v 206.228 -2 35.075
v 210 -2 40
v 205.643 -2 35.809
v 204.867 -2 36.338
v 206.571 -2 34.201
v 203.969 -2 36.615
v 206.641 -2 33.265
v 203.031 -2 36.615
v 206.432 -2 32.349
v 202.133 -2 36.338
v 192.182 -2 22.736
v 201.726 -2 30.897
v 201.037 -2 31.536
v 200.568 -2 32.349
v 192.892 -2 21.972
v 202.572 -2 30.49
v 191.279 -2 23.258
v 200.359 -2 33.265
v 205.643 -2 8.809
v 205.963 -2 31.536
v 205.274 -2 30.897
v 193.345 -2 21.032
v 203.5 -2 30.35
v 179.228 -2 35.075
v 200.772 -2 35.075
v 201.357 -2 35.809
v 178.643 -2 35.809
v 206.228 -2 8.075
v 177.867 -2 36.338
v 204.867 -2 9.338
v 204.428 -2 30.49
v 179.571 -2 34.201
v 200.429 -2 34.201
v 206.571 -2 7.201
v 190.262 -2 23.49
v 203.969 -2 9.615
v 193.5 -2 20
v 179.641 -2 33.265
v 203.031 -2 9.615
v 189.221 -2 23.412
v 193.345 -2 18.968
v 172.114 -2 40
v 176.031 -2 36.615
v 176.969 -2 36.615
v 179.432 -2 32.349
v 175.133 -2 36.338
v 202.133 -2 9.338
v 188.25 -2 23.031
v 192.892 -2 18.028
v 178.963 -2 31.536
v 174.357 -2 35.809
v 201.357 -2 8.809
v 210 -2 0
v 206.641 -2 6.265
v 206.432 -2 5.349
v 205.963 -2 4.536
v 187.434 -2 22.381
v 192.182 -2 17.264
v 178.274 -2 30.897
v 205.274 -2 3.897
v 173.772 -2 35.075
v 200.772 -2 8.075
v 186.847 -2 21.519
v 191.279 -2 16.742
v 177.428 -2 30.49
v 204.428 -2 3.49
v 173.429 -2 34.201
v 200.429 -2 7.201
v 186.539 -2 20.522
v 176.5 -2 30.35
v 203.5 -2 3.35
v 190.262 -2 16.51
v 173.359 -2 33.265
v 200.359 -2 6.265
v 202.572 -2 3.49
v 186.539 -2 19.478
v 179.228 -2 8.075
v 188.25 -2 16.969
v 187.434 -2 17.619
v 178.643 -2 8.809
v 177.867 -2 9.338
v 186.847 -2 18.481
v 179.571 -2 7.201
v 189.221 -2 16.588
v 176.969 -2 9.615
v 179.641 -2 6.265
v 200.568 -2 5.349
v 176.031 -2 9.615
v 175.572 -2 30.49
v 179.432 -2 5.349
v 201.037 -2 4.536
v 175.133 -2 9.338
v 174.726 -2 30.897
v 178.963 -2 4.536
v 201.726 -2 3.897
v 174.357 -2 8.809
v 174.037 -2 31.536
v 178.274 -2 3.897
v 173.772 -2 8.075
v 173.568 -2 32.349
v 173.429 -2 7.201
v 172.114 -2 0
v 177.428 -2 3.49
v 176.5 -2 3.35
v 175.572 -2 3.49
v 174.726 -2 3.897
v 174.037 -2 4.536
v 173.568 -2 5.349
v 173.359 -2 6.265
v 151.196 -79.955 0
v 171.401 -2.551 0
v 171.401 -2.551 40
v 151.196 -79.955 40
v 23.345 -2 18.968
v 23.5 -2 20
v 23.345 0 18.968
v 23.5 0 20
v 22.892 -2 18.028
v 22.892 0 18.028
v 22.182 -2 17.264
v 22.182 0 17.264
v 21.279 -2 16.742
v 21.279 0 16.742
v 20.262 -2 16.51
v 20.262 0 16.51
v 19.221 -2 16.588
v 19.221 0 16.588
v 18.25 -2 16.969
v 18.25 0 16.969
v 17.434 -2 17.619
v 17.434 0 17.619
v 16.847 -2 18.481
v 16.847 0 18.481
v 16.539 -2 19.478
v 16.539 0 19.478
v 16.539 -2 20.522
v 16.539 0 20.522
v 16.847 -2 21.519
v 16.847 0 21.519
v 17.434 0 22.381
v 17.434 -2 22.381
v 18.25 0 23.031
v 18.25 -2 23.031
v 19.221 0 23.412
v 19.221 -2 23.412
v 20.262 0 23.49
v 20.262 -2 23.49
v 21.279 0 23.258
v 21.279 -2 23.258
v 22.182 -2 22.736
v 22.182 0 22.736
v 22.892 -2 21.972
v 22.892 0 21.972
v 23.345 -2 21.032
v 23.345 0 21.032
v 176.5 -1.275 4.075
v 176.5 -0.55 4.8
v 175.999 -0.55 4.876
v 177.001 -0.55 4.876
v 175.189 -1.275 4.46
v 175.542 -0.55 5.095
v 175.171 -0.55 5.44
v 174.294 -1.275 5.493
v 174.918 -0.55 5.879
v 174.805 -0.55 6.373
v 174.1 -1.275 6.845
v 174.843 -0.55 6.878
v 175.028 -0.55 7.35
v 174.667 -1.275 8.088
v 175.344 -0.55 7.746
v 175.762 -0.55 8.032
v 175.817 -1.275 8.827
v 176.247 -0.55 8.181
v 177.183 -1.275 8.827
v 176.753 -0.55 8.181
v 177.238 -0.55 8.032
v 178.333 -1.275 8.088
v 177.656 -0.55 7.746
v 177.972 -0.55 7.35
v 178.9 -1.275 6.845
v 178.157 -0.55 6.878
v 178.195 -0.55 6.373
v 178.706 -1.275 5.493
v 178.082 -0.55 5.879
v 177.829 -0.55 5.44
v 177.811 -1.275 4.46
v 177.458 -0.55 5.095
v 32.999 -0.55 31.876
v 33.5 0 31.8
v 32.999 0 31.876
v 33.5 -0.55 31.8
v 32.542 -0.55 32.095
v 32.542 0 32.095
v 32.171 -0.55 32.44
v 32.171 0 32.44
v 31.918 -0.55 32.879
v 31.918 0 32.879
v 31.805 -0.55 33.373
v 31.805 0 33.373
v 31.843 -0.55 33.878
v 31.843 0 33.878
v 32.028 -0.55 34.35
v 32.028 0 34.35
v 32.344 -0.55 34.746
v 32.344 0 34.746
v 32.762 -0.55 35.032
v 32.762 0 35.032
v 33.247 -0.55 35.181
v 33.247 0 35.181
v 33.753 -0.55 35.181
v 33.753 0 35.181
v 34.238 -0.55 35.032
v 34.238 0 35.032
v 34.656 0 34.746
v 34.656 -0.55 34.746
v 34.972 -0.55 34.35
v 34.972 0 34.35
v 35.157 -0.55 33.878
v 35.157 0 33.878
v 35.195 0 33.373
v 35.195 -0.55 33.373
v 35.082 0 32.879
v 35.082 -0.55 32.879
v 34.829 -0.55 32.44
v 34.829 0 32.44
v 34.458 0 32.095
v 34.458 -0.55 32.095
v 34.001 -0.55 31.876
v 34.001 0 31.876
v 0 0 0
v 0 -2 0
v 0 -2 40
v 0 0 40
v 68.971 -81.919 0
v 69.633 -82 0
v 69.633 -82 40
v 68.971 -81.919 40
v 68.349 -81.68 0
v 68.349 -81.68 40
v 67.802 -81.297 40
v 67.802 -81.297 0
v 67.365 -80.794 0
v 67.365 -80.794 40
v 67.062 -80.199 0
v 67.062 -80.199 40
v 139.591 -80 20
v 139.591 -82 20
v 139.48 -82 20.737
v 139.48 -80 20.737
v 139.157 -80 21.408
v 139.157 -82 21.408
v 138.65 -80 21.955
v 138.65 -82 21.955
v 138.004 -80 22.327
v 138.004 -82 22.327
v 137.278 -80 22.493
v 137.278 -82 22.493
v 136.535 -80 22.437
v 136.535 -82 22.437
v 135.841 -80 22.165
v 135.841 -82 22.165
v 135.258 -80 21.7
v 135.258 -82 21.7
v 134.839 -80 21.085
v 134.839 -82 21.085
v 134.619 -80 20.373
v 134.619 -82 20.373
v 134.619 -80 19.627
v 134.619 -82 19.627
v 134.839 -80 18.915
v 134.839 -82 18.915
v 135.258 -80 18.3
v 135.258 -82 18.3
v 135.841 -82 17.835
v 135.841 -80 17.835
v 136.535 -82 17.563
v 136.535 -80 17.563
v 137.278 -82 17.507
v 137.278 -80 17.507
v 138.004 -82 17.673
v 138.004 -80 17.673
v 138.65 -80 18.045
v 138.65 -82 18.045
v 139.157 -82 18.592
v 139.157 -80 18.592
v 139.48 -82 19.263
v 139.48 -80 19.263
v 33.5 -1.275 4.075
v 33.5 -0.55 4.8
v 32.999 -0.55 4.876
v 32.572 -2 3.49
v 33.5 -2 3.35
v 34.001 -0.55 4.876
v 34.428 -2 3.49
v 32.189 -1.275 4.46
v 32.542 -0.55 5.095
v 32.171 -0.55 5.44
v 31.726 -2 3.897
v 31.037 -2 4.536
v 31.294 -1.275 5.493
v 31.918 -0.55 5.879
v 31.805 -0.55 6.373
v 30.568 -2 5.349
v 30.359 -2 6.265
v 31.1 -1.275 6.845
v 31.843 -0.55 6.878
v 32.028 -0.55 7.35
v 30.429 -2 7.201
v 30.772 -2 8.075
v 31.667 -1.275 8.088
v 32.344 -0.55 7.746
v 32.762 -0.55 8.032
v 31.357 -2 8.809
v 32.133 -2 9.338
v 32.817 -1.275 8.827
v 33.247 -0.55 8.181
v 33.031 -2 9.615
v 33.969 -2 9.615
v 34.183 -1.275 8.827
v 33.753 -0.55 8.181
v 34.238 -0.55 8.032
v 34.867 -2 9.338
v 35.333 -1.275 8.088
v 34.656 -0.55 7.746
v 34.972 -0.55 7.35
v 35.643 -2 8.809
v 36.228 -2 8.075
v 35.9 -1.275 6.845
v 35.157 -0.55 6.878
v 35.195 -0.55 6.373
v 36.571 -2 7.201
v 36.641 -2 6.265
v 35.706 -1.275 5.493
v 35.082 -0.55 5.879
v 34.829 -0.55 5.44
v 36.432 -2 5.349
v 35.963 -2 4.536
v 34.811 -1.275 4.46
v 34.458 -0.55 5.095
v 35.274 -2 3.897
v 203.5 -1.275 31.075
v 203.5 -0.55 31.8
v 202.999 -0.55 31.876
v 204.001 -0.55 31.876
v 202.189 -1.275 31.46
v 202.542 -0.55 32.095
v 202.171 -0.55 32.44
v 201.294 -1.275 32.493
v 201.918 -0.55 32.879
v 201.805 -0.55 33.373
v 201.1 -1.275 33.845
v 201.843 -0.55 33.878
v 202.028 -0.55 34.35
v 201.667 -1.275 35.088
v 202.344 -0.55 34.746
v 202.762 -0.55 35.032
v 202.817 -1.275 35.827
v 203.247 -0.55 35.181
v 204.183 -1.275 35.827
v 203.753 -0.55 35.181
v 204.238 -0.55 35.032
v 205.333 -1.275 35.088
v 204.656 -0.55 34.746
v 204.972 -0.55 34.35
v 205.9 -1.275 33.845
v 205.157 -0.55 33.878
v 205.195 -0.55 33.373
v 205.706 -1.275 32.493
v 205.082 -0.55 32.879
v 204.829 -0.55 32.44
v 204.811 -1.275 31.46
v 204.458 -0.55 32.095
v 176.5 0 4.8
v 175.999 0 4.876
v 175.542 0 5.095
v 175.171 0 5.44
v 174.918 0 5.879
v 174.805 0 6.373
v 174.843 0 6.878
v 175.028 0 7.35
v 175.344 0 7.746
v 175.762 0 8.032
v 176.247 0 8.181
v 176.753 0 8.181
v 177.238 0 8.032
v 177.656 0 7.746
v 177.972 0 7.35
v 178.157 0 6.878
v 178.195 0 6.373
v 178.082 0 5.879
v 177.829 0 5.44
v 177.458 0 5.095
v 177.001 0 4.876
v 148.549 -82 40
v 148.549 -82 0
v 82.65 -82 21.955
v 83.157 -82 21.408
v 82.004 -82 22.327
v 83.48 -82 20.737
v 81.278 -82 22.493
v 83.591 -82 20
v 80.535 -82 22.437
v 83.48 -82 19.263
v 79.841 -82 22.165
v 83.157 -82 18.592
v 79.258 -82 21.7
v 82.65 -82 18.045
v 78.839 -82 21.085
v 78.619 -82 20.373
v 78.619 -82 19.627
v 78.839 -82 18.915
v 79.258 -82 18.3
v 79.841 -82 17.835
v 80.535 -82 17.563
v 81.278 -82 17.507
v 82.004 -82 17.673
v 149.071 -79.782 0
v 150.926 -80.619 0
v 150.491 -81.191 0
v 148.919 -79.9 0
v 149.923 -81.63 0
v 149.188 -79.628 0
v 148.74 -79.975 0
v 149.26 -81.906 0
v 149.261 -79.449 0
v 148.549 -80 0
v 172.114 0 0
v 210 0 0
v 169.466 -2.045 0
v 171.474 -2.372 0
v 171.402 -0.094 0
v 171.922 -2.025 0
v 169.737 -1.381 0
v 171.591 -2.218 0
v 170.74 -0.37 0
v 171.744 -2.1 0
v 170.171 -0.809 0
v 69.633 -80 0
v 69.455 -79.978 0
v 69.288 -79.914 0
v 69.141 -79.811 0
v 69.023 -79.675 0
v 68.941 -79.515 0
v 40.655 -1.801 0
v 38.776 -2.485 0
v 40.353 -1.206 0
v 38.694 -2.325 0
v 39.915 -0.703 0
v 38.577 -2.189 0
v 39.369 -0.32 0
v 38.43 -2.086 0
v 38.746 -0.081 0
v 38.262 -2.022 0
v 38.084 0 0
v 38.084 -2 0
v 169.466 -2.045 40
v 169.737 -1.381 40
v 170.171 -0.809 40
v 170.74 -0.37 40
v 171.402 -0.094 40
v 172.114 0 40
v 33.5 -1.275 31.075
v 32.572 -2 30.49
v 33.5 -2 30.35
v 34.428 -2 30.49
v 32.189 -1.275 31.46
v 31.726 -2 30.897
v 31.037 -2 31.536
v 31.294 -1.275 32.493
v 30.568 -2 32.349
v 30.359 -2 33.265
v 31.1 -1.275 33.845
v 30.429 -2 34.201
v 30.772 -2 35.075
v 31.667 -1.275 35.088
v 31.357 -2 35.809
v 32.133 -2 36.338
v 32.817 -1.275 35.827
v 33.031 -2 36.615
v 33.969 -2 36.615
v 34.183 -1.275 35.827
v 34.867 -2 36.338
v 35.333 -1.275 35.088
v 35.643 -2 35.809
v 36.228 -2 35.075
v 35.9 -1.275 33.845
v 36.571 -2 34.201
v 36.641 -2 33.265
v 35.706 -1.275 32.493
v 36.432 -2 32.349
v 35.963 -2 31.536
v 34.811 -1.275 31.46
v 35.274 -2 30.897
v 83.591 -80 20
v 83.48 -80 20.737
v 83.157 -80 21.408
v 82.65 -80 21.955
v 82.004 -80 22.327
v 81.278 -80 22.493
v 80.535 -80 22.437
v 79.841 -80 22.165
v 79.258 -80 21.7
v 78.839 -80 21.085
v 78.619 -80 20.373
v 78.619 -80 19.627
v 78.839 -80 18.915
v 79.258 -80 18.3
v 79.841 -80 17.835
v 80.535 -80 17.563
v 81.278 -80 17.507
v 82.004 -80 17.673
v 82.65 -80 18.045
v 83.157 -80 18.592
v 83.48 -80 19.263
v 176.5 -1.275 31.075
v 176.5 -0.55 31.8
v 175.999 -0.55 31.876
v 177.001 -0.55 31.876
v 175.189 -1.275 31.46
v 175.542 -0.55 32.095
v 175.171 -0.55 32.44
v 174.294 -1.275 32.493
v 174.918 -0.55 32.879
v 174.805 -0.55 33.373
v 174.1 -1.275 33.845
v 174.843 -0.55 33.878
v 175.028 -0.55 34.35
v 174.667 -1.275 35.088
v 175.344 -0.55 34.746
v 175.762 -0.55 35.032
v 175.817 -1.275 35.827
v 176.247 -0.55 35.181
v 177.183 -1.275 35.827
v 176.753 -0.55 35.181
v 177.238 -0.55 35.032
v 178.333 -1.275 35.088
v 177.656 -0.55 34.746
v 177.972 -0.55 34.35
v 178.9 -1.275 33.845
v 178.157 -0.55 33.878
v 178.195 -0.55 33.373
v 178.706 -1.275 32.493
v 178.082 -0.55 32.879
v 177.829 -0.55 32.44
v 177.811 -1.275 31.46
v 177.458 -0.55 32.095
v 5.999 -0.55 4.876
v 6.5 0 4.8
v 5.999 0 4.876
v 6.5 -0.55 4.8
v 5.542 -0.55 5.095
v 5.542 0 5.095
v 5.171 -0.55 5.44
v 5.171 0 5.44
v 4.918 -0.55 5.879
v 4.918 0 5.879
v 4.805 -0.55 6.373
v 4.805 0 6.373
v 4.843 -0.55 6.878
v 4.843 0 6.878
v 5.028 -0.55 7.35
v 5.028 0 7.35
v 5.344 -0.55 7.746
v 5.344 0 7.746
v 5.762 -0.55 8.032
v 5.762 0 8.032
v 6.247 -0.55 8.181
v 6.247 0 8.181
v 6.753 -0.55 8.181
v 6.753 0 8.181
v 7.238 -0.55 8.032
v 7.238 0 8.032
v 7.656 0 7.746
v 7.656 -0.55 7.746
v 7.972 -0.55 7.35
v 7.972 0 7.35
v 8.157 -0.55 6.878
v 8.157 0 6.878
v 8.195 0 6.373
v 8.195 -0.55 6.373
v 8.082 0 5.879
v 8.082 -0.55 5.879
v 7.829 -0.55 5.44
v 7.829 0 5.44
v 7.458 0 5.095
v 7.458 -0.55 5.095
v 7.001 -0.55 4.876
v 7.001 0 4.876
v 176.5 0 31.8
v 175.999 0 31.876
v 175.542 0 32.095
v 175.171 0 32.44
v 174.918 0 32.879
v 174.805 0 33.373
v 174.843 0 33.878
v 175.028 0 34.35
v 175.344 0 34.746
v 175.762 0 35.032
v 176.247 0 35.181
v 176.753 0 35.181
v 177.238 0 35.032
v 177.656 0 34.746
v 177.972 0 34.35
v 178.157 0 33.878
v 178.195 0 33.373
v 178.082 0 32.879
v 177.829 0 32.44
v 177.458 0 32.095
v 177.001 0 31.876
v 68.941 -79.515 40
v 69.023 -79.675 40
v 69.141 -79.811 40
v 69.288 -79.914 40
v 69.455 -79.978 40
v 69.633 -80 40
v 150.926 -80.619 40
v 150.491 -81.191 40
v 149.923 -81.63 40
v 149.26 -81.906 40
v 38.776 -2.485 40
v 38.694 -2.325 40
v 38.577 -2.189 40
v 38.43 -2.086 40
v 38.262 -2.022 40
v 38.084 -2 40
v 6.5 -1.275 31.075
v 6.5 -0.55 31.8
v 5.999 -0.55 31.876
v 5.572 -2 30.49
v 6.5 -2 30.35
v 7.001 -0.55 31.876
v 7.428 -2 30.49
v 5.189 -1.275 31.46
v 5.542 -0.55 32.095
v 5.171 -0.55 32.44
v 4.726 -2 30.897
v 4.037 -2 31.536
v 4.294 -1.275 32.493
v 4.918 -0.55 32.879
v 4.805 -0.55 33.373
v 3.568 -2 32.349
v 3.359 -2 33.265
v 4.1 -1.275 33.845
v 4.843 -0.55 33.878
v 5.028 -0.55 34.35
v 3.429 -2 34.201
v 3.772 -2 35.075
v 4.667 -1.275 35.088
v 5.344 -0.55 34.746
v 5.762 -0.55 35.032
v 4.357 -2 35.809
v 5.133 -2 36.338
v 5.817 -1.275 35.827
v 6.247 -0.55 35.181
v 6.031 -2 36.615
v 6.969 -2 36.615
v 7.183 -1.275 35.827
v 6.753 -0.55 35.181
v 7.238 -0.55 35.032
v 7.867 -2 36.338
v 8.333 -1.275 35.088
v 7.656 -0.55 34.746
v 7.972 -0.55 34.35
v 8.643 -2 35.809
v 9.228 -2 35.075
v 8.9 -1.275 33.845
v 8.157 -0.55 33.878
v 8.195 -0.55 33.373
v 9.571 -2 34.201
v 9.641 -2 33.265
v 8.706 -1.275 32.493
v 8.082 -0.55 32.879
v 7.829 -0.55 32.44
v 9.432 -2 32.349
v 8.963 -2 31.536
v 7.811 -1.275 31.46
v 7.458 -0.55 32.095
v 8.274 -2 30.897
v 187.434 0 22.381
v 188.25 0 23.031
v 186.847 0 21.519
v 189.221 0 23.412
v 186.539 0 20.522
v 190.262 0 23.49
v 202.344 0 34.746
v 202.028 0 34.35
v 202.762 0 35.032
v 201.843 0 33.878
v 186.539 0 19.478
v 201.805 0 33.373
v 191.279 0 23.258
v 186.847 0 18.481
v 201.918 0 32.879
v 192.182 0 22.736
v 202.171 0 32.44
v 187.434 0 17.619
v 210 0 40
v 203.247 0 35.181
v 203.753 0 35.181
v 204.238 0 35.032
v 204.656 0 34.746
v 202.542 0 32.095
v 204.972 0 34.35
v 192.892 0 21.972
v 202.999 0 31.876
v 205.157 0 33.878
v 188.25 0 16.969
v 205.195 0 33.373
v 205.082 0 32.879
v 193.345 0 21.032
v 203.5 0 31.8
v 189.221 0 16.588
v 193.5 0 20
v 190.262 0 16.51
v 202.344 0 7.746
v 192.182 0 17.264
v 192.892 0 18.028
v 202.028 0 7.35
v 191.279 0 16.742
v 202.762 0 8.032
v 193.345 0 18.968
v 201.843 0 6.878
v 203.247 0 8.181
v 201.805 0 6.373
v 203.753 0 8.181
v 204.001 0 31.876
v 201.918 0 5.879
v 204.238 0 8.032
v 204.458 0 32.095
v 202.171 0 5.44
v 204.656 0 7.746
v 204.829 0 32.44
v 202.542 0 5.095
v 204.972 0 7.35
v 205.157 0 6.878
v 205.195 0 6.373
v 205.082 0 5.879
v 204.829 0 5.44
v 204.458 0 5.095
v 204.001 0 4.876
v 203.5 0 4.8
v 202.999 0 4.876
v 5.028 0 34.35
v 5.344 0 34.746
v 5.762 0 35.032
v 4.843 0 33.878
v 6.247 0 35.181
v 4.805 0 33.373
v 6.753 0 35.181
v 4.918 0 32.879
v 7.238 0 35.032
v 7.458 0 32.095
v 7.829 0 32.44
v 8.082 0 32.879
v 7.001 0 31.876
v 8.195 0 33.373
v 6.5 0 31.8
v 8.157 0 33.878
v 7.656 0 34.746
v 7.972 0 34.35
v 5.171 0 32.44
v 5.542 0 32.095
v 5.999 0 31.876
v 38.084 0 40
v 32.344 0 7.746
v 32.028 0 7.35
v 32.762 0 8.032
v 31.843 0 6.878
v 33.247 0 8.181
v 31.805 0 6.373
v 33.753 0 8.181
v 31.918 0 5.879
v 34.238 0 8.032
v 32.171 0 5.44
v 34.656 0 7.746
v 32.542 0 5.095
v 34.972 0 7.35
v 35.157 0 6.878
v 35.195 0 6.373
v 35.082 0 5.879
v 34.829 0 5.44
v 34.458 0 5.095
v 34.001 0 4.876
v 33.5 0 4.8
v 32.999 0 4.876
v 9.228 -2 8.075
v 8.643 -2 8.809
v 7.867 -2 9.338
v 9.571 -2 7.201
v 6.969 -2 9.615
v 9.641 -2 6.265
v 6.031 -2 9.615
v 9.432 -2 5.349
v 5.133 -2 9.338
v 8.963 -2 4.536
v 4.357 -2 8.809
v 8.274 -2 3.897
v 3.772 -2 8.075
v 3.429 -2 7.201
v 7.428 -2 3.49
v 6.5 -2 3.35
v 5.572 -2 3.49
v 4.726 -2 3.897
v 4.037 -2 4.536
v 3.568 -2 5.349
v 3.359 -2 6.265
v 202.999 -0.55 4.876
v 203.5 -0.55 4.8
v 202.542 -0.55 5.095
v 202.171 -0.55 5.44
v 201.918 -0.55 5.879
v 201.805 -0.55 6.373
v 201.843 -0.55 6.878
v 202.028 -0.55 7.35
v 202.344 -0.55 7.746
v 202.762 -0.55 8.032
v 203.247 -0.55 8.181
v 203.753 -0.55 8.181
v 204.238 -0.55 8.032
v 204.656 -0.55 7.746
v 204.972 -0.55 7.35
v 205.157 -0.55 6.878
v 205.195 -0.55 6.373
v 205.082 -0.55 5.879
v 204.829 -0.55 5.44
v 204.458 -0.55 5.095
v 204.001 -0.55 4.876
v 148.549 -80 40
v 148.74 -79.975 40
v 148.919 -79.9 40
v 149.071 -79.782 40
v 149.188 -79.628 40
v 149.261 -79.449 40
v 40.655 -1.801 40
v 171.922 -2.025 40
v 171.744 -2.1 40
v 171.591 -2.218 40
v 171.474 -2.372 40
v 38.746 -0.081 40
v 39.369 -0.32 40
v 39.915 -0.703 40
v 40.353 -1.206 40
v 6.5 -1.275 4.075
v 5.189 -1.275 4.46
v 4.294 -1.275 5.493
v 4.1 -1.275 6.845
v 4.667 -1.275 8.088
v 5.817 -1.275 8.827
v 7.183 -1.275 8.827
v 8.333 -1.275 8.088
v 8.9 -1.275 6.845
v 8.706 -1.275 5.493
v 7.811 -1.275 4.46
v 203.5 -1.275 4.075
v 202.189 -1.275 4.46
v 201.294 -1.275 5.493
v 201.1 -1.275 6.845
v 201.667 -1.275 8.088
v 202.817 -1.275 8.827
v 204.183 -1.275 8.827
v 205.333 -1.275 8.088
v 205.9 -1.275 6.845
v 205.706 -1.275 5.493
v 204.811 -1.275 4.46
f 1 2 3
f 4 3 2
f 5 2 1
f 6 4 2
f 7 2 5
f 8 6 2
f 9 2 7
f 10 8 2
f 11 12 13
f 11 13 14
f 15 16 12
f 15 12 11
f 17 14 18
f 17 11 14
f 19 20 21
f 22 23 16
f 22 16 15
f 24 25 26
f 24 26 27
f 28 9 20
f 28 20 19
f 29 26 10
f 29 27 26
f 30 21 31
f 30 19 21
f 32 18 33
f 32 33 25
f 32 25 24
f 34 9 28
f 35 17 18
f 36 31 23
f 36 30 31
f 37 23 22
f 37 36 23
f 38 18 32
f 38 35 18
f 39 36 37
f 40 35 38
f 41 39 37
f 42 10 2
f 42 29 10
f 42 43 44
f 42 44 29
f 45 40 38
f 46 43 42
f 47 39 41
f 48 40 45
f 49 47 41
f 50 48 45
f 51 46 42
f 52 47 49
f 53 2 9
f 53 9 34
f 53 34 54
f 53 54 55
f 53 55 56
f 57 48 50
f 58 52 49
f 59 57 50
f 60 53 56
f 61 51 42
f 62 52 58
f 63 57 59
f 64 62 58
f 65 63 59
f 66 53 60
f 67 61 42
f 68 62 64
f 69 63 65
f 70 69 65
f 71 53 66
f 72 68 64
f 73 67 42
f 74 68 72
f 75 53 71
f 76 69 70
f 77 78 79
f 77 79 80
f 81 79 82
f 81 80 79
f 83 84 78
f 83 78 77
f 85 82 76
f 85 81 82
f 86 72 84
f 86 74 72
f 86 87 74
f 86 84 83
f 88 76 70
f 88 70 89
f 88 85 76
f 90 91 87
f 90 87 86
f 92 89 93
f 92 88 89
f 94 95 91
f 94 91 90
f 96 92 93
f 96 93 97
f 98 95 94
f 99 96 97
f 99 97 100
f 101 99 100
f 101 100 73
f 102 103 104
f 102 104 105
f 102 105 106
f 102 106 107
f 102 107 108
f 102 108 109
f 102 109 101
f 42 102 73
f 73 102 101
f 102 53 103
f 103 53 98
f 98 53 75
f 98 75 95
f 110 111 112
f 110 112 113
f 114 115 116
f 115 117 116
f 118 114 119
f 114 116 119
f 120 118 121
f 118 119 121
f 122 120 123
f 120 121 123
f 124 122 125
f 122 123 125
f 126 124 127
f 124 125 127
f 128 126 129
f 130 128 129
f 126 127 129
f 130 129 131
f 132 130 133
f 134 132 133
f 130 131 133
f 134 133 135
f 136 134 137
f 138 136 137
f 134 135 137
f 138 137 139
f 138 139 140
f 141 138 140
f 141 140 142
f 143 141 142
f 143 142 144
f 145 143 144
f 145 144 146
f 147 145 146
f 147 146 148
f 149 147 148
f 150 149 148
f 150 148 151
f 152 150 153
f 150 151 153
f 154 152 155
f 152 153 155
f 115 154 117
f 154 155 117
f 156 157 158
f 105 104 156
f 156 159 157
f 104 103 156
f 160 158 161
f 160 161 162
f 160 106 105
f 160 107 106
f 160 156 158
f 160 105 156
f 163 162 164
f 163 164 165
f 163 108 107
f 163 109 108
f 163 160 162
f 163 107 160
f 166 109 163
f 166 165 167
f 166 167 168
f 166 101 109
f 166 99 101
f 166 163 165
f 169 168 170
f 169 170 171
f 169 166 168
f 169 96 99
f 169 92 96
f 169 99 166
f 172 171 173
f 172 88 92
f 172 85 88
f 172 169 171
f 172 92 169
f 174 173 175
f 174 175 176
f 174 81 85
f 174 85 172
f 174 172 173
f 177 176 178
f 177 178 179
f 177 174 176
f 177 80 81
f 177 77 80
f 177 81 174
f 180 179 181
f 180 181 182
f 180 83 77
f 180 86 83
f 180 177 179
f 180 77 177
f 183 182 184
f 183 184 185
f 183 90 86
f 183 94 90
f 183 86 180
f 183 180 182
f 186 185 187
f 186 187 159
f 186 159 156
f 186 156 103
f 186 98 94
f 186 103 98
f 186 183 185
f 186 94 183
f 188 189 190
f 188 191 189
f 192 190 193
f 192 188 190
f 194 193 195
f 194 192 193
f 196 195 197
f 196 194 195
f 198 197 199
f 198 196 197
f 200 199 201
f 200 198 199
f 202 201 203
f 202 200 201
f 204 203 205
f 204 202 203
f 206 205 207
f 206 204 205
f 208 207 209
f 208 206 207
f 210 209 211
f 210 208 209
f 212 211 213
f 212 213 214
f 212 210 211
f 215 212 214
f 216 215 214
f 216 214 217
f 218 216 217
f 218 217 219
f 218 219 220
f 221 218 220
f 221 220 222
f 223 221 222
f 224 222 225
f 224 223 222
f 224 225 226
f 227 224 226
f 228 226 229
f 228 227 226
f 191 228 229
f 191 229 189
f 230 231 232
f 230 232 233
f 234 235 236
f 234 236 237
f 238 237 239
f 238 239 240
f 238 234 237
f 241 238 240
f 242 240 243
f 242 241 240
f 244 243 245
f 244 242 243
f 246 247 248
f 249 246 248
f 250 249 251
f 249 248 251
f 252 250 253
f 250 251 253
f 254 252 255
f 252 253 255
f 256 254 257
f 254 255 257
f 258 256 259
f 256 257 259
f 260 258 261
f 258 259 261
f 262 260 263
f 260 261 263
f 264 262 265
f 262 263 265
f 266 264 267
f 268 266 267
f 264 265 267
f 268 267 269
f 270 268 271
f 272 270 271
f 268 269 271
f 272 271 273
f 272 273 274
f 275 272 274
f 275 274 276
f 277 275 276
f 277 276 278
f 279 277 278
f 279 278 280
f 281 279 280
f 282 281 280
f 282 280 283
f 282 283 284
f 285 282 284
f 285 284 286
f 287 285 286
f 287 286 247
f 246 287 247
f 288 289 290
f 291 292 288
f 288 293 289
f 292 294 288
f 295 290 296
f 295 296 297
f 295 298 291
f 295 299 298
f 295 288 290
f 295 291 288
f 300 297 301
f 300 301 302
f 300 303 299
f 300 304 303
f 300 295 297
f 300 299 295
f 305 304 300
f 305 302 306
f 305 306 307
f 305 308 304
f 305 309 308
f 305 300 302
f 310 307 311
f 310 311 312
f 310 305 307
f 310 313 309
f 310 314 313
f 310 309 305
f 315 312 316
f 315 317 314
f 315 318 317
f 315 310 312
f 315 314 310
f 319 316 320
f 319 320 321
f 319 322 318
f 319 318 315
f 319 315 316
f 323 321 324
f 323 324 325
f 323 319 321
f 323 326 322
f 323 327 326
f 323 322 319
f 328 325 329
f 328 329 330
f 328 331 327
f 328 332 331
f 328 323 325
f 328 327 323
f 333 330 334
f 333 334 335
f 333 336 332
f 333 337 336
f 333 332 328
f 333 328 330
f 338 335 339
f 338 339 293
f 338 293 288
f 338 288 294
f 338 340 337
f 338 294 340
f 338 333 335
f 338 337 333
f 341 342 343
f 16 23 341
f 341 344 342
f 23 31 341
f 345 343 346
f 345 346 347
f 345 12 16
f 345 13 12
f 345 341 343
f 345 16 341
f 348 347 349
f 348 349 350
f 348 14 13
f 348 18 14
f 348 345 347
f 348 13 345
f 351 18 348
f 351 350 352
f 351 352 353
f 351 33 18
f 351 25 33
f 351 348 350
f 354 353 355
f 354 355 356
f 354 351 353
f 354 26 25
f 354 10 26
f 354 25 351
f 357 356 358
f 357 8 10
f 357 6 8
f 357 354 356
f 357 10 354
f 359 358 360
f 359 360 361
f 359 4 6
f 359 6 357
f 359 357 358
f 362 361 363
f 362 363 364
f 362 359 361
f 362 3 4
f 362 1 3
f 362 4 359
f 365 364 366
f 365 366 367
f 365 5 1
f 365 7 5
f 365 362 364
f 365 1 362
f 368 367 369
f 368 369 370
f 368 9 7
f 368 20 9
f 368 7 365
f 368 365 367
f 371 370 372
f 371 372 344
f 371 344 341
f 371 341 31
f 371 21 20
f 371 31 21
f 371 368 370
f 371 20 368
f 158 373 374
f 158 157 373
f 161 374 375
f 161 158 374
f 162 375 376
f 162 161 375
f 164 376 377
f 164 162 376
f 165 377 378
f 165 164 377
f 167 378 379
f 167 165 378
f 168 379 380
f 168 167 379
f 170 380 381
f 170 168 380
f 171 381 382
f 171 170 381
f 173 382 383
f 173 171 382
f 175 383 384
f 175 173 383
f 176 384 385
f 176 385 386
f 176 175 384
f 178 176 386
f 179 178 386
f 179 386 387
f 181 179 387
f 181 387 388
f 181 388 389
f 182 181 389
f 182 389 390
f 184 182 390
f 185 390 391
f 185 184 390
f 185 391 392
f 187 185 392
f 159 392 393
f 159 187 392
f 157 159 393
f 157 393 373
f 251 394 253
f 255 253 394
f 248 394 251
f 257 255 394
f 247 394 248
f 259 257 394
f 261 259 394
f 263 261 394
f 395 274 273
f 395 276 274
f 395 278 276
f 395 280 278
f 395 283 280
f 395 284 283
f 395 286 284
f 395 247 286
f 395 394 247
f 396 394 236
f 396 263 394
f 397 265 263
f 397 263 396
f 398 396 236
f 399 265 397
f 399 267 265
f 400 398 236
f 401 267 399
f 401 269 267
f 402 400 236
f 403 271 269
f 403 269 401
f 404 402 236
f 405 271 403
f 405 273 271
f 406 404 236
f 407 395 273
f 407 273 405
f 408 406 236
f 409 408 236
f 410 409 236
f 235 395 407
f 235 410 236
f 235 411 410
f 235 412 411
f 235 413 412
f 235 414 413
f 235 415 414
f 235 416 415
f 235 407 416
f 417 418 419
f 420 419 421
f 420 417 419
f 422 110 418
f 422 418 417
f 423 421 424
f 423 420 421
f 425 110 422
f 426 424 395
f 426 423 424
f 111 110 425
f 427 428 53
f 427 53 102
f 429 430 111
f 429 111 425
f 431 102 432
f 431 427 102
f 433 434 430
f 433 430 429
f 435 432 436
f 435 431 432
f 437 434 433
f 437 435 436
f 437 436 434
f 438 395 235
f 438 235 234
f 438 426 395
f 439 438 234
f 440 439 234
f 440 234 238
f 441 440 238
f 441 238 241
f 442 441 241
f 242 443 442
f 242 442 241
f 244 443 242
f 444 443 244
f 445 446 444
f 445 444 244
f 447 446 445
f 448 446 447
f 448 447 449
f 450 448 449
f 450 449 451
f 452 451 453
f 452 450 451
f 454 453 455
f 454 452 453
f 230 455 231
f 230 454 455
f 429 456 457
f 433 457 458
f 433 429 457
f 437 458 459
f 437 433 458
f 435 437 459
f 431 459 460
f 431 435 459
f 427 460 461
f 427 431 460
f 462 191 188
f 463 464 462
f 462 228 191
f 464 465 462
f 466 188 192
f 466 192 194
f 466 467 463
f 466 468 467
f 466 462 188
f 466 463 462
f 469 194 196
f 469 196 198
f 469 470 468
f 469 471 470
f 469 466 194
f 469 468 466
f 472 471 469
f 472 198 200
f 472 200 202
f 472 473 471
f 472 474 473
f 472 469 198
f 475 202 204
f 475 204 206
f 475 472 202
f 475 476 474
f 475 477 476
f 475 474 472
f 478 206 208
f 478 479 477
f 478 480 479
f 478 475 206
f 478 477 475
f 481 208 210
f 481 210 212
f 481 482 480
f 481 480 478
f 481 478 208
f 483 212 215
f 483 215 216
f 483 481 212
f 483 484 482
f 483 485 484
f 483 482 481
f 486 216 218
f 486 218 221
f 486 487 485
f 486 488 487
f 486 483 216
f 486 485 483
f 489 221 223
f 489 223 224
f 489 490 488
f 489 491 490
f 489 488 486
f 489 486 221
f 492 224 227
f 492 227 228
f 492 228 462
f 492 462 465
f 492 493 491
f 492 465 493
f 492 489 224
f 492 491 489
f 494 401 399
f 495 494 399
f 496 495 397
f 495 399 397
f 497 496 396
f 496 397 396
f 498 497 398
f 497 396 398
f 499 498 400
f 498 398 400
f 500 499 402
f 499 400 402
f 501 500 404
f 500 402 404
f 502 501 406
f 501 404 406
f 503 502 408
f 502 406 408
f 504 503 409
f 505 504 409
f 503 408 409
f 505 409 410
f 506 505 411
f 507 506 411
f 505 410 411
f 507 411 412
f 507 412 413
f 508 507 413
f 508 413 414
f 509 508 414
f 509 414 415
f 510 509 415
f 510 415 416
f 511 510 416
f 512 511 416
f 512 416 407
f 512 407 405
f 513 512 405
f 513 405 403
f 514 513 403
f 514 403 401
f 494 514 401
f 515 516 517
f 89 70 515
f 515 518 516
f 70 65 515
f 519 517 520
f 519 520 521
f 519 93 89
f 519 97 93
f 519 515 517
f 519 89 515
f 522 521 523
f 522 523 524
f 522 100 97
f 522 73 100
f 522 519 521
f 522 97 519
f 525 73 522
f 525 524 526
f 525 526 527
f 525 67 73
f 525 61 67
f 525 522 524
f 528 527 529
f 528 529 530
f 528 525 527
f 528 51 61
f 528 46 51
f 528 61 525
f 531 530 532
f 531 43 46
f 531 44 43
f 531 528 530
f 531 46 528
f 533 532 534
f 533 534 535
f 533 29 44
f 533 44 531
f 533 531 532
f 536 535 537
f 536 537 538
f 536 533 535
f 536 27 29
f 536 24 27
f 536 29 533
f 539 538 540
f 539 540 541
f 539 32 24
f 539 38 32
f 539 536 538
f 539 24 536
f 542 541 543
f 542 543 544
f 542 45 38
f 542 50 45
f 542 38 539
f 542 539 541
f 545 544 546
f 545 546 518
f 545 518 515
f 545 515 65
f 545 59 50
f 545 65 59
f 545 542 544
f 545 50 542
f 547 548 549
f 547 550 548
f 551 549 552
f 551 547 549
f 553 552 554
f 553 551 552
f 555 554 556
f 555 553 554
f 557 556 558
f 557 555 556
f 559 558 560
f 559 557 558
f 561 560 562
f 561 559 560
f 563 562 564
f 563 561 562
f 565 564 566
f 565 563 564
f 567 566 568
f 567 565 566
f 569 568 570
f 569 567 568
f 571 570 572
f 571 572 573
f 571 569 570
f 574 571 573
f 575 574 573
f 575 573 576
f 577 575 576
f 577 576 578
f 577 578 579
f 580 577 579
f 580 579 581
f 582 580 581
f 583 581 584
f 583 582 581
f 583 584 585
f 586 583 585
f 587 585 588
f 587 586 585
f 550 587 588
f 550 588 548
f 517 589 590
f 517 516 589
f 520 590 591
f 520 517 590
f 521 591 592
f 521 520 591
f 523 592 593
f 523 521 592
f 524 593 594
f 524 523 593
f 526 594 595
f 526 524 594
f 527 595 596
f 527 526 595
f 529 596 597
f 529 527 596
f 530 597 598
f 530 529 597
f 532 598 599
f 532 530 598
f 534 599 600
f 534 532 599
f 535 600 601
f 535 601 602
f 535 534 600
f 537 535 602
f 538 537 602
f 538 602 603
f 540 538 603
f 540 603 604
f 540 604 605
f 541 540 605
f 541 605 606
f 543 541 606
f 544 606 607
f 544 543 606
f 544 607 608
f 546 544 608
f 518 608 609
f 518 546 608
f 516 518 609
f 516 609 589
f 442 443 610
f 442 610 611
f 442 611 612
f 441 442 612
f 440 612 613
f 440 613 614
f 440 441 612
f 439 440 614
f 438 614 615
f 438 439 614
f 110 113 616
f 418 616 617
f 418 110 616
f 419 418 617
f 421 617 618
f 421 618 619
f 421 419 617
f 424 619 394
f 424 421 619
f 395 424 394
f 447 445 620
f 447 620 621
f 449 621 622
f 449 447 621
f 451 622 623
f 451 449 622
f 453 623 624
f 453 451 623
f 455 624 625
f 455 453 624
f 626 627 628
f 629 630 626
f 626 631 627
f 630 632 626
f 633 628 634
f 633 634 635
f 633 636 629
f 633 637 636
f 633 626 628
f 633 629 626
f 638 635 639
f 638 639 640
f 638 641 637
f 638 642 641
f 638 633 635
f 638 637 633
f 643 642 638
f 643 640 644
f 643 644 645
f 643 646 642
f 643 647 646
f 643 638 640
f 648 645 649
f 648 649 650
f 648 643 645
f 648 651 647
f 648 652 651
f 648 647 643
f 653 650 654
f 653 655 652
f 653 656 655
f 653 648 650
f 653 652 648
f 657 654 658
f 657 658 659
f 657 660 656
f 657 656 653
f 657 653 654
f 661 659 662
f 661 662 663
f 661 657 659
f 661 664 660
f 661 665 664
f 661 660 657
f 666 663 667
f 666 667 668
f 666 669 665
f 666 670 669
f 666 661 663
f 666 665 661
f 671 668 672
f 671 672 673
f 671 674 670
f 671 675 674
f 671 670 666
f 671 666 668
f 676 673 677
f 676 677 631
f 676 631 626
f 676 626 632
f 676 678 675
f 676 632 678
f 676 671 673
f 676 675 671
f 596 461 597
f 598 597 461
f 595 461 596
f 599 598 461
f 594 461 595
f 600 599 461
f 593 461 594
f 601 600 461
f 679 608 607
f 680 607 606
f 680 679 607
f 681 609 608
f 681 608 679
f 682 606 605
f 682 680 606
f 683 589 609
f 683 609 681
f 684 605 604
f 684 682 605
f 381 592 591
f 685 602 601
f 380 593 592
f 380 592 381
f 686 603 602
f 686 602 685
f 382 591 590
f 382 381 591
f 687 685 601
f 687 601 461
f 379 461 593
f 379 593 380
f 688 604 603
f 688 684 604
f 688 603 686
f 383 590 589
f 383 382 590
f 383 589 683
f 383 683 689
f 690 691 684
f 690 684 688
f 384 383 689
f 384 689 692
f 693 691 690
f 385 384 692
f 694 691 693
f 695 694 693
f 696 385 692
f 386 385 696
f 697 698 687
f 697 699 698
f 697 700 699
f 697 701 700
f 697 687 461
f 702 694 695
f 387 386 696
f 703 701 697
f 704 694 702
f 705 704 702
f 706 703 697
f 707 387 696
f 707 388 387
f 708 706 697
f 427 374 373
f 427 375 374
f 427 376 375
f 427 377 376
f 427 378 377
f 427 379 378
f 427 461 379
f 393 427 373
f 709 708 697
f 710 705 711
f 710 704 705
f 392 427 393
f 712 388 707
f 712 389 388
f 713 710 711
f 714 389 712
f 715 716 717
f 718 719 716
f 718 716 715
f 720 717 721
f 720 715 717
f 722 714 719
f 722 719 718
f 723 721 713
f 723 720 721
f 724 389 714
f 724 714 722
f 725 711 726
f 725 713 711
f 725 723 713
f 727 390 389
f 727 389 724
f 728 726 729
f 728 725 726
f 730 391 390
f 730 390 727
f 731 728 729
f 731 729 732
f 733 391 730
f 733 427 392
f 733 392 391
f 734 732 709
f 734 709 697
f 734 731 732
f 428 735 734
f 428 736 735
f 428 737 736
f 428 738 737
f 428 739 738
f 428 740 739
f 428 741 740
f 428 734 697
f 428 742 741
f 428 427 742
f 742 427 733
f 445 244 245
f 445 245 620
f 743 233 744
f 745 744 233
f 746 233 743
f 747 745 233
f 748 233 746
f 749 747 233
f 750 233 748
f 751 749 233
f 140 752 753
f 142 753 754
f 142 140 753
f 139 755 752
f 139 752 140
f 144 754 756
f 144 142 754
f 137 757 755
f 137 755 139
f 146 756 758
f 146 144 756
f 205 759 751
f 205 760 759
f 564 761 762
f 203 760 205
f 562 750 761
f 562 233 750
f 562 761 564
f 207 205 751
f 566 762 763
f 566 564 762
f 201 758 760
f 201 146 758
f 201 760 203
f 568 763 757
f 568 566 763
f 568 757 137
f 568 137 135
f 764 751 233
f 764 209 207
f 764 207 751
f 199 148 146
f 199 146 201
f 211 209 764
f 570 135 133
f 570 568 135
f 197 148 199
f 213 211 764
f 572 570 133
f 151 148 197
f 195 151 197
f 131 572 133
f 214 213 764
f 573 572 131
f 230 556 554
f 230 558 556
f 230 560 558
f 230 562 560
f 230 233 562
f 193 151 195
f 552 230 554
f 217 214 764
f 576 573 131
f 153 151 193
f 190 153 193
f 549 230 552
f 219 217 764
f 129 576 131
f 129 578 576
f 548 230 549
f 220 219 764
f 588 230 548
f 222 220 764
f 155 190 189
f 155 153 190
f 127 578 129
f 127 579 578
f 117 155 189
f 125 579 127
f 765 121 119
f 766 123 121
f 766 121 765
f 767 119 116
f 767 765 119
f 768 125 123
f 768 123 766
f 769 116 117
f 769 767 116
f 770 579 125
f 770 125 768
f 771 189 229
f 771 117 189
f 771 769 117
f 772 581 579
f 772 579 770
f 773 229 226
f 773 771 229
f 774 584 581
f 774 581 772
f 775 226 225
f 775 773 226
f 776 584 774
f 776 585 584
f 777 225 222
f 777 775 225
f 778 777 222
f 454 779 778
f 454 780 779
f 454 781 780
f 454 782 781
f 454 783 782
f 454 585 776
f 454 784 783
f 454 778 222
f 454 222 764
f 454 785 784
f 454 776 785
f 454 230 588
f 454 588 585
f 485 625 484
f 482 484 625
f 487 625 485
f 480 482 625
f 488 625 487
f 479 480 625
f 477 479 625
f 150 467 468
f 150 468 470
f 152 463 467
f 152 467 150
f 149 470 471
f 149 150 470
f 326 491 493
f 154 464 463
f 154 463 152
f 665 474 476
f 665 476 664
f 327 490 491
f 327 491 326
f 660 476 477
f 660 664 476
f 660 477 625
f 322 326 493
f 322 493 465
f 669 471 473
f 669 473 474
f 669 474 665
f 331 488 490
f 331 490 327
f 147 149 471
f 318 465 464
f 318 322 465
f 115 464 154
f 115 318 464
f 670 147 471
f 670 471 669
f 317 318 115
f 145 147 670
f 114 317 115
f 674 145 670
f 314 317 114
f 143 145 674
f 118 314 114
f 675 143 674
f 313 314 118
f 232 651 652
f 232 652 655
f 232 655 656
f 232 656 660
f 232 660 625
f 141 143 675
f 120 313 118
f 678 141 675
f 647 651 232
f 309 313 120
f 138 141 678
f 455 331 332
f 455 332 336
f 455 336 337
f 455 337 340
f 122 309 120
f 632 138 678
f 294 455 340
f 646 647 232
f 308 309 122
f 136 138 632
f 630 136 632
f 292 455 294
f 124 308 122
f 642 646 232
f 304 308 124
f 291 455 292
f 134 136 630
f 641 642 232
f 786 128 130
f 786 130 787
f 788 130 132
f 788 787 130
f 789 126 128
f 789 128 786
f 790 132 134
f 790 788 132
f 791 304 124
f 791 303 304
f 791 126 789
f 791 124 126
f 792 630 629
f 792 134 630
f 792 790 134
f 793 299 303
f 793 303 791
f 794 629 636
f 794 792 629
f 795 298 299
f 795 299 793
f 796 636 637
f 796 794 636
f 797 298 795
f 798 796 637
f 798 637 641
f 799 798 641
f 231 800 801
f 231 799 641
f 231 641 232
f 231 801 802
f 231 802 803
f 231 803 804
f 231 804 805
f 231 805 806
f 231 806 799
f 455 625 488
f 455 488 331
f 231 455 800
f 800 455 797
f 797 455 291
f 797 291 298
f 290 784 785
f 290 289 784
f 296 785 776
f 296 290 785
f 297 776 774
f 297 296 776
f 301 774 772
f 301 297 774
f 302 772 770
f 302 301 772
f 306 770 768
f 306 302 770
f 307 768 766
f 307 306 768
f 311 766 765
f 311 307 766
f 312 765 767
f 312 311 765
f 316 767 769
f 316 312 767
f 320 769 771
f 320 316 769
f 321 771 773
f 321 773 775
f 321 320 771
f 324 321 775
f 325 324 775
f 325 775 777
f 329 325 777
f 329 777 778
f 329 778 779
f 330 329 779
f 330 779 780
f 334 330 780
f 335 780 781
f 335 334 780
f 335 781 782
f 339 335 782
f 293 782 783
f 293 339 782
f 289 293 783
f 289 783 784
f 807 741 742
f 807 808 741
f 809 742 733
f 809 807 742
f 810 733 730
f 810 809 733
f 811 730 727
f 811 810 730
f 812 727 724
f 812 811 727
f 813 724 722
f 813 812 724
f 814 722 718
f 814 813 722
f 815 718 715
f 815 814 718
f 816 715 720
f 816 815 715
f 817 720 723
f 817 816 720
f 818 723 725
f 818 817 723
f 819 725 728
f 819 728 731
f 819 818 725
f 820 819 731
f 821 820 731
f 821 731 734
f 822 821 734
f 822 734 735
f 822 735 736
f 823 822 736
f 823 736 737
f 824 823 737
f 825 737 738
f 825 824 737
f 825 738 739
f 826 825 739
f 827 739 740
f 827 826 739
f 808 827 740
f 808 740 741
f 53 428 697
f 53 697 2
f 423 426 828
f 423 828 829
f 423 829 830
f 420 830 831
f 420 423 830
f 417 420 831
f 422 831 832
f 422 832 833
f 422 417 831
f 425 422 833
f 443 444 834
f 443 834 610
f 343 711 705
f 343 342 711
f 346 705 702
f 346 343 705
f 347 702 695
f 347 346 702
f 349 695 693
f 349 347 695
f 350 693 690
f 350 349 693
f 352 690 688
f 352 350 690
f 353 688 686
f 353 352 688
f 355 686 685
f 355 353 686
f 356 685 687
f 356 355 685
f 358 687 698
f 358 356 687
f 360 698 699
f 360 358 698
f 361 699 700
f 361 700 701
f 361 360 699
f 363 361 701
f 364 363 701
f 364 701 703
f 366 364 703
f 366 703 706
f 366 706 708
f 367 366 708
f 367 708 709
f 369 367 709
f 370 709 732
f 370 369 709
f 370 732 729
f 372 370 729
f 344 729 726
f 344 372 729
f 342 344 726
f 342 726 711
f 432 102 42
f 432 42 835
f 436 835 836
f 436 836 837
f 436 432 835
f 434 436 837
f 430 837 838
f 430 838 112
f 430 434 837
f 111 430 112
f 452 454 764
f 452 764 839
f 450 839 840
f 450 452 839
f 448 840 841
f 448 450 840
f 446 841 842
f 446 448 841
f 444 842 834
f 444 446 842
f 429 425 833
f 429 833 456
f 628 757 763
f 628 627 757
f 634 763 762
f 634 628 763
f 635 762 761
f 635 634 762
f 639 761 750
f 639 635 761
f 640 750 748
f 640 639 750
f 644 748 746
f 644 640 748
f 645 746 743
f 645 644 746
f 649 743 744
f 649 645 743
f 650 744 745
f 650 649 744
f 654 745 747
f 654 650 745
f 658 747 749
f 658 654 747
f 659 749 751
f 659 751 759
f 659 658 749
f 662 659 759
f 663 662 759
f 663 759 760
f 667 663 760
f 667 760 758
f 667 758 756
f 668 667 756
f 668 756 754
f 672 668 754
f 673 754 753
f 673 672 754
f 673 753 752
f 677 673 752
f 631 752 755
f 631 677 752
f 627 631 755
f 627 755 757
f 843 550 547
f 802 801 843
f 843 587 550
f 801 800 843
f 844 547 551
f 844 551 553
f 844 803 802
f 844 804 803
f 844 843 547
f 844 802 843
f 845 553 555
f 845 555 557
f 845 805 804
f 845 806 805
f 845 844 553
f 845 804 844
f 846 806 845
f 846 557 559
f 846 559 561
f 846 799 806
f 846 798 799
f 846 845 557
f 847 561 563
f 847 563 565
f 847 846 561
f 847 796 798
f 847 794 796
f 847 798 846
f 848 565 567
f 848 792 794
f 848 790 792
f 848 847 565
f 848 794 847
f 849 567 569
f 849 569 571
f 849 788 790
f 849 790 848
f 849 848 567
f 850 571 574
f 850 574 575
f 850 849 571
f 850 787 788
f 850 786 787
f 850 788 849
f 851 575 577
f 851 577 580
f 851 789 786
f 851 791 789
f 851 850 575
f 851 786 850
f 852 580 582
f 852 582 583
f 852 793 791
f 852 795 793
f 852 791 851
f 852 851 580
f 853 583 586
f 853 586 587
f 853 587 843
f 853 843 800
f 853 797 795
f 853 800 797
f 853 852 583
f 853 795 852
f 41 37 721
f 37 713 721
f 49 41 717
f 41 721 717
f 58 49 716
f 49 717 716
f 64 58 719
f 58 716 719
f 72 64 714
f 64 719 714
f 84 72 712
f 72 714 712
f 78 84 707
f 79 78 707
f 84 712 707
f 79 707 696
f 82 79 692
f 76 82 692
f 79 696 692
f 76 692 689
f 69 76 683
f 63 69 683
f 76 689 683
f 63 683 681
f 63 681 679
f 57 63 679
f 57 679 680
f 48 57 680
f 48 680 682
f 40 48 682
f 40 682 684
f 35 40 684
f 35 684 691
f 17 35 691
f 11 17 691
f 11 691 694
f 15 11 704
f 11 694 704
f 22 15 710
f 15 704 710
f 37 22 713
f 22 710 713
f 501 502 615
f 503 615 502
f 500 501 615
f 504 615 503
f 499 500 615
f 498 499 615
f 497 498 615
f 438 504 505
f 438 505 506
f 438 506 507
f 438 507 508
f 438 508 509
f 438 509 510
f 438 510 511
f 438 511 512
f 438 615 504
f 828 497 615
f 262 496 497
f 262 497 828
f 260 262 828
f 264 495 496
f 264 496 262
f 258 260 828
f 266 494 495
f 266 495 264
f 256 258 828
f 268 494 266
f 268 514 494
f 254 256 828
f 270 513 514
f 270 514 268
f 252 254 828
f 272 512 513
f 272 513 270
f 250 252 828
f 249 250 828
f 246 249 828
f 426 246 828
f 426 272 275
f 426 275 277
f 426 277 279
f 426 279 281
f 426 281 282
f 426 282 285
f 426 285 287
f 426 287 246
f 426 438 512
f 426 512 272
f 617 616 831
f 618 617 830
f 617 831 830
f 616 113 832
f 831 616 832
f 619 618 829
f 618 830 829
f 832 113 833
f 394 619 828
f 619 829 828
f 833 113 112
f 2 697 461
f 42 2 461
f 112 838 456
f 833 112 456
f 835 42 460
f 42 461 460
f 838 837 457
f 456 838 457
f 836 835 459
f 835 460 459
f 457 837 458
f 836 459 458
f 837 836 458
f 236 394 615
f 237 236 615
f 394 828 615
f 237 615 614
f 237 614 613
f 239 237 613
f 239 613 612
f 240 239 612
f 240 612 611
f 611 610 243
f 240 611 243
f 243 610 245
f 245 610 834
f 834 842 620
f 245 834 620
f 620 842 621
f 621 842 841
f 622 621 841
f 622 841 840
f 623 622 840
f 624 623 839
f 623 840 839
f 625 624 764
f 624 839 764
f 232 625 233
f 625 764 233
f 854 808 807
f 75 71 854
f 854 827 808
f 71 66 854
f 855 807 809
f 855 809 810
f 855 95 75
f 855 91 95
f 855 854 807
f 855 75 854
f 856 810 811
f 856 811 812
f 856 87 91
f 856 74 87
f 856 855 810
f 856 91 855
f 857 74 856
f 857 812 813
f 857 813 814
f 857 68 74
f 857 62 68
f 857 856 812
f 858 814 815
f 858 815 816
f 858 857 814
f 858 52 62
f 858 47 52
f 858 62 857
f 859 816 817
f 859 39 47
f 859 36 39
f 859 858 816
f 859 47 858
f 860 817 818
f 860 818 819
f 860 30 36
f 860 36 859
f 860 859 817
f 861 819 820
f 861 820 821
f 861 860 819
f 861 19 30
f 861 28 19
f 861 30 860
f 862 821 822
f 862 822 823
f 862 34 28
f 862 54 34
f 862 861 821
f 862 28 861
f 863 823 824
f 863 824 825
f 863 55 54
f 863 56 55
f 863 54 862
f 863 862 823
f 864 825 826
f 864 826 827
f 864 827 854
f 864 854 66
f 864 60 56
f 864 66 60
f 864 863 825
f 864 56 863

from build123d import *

# Parameters (mm, degrees)
SM_BASE_FLANGE_1_DEPTH      = 40
SKETCH_6_R                  = 2.5
CUT_EXTRUDE_1_DEPTH         = 229.962879087
HOLE_WIZARD_M3_1_AT_2_COUNT = 2
HOLE_WIZARD_M3_1_AT_2_PITCH = 27
HOLE_WIZARD_M3_1_AT_3_COUNT = 2
HOLE_WIZARD_M3_1_AT_3_PITCH = 38.183766184
HOLE_WIZARD_M3_1_AT_4_COUNT = 2
HOLE_WIZARD_M3_1_AT_4_PITCH = 27
HOLE_WIZARD_M3_1_AT_5_COUNT = 2
HOLE_WIZARD_M3_1_AT_5_PITCH = 172.130764246
HOLE_WIZARD_M3_1_AT_6_COUNT = 2
HOLE_WIZARD_M3_1_AT_6_PITCH = 198.841645537
HOLE_WIZARD_M3_1_AT_7_COUNT = 2
HOLE_WIZARD_M3_1_AT_7_PITCH = 170
HOLE_WIZARD_M3_1_AT_8_COUNT = 2
HOLE_WIZARD_M3_1_AT_8_PITCH = 197
HOLE_WIZARD_7_0_7_1_D       = 7
HOLE_WIZARD_7_0_7_1_DEPTH   = 2
HOLE_WIZARD_7_0_7_1_TIP     = 2.103012167


# Sheet-metal steps are written as plain solids
with BuildPart() as part:
    # Sketch 1 → 基材-凸緣1 (new body)
    with BuildSketch(Plane.XY):
        with BuildLine():
            Line((0, 0), (38.083812051, 0))
            ThreePointArc((38.083812051, 0), (39.653461327, -0.494908516), (40.655374877, -1.800627676))
            Line((40.655374877, -1.800627676), (68.941214029, -79.515332038))
            ThreePointArc((68.941214029, -79.515332038), (69.210895211, -79.866787396), (69.633391614, -80))
            Line((69.633391614, -80), (148.548612075, -80))
            ThreePointArc((148.548612075, -80), (148.998913005, -79.84633107), (149.261331062, -79.44944087))
            Line((149.261331062, -79.44944087), (169.46608317, -2.045425081))
            ThreePointArc((169.46608317, -2.045425081), (170.441012922, -0.570907404), (172.11396096, 0))
            Line((172.11396096, 0), (210, 0))
            Line((210, 0), (210, -2))
            Line((210, -2), (172.11396096, -2))
            ThreePointArc((172.11396096, -2), (171.66366003, -2.15366893), (171.401241973, -2.55055913))
            Line((171.401241973, -2.55055913), (151.196489865, -79.954574919))
            ThreePointArc((151.196489865, -79.954574919), (150.221560113, -81.429092596), (148.548612075, -82))
            Line((148.548612075, -82), (69.633391614, -82))
            ThreePointArc((69.633391614, -82), (68.063742338, -81.505091484), (67.061828788, -80.199372324))
            Line((67.061828788, -80.199372324), (38.775989635, -2.484667962))
            ThreePointArc((38.775989635, -2.484667962), (38.506308454, -2.133212604), (38.083812051, -2))
            Line((38.083812051, -2), (0, -2))
            Line((0, -2), (0, 0))
        make_face()
    extrude(amount=SM_BASE_FLANGE_1_DEPTH)

    # 草圖6 → 除料-伸長1 (cut, through all)
    with BuildSketch(Plane.XZ.offset(82)):
        with Locations((137.091001844, 20)):
            Circle(SKETCH_6_R)
        with Locations((81.091001844, 20)):
            Circle(SKETCH_6_R)
    extrude(amount=-CUT_EXTRUDE_1_DEPTH, mode=Mode.SUBTRACT)

    # 草圖13 → M3 高錐坑頭螺釘的錐孔1 (revolve, cut)
    with BuildSketch(Plane(origin=(6.5, -2, 33.5), x_dir=(0, 0, -1), z_dir=(1, 0, 0))):
        Polygon((0, 0), (0, 3.021463052), (1.7, 2), (1.7, 1.45), (3.15, 0), align=None)
    hole_wizard_m3_1 = revolve(axis=Axis((6.5, -8.35, 33.5), (0, 1, 0)), mode=Mode.SUBTRACT)

    # M3 高錐坑頭螺釘的錐孔1 at 2: M3 高錐坑頭螺釘的錐孔1 ×2
    with Locations(*[(i * HOLE_WIZARD_M3_1_AT_2_PITCH, 0, 0) for i in range(1, HOLE_WIZARD_M3_1_AT_2_COUNT)]):
        add(hole_wizard_m3_1, mode=Mode.SUBTRACT)

    # M3 高錐坑頭螺釘的錐孔1 at 3: M3 高錐坑頭螺釘的錐孔1 ×2
    with Locations(*[Vector(0.7071067811865476, 0, -0.7071067811865476) * (i * HOLE_WIZARD_M3_1_AT_3_PITCH) for i in range(1, HOLE_WIZARD_M3_1_AT_3_COUNT)]):
        add(hole_wizard_m3_1, mode=Mode.SUBTRACT)

    # M3 高錐坑頭螺釘的錐孔1 at 4: M3 高錐坑頭螺釘的錐孔1 ×2
    with Locations(*[(0, 0, -i * HOLE_WIZARD_M3_1_AT_4_PITCH) for i in range(1, HOLE_WIZARD_M3_1_AT_4_COUNT)]):
        add(hole_wizard_m3_1, mode=Mode.SUBTRACT)

    # M3 高錐坑頭螺釘的錐孔1 at 5: M3 高錐坑頭螺釘的錐孔1 ×2
    with Locations(*[Vector(0.9876212468143859, 0, -0.15685749214110833) * (i * HOLE_WIZARD_M3_1_AT_5_PITCH) for i in range(1, HOLE_WIZARD_M3_1_AT_5_COUNT)]):
        add(hole_wizard_m3_1, mode=Mode.SUBTRACT)

    # M3 高錐坑頭螺釘的錐孔1 at 6: M3 高錐坑頭螺釘的錐孔1 ×2
    with Locations(*[Vector(0.9907381296691129, 0, -0.13578644416784796) * (i * HOLE_WIZARD_M3_1_AT_6_PITCH) for i in range(1, HOLE_WIZARD_M3_1_AT_6_COUNT)]):
        add(hole_wizard_m3_1, mode=Mode.SUBTRACT)

    # M3 高錐坑頭螺釘的錐孔1 at 7: M3 高錐坑頭螺釘的錐孔1 ×2
    with Locations(*[(i * HOLE_WIZARD_M3_1_AT_7_PITCH, 0, 0) for i in range(1, HOLE_WIZARD_M3_1_AT_7_COUNT)]):
        add(hole_wizard_m3_1, mode=Mode.SUBTRACT)

    # M3 高錐坑頭螺釘的錐孔1 at 8: M3 高錐坑頭螺釘的錐孔1 ×2
    with Locations(*[(i * HOLE_WIZARD_M3_1_AT_8_PITCH, 0, 0) for i in range(1, HOLE_WIZARD_M3_1_AT_8_COUNT)]):
        add(hole_wizard_m3_1, mode=Mode.SUBTRACT)

    # Ø7.0 (7) 直徑孔1
    with Locations(Plane(origin=(0, -2, 0), x_dir=(-1, 0, 0), z_dir=(0, -1, 0))):
        with Locations((-20, -20), (-190, -20)):
            Hole(HOLE_WIZARD_7_0_7_1_D / 2, depth=HOLE_WIZARD_7_0_7_1_DEPTH)
            with Locations((0, 0, -(HOLE_WIZARD_7_0_7_1_DEPTH + HOLE_WIZARD_7_0_7_1_TIP / 2))):  # 118° drill point
                Cone(0, HOLE_WIZARD_7_0_7_1_D / 2, HOLE_WIZARD_7_0_7_1_TIP, mode=Mode.SUBTRACT)


solid = part.part
